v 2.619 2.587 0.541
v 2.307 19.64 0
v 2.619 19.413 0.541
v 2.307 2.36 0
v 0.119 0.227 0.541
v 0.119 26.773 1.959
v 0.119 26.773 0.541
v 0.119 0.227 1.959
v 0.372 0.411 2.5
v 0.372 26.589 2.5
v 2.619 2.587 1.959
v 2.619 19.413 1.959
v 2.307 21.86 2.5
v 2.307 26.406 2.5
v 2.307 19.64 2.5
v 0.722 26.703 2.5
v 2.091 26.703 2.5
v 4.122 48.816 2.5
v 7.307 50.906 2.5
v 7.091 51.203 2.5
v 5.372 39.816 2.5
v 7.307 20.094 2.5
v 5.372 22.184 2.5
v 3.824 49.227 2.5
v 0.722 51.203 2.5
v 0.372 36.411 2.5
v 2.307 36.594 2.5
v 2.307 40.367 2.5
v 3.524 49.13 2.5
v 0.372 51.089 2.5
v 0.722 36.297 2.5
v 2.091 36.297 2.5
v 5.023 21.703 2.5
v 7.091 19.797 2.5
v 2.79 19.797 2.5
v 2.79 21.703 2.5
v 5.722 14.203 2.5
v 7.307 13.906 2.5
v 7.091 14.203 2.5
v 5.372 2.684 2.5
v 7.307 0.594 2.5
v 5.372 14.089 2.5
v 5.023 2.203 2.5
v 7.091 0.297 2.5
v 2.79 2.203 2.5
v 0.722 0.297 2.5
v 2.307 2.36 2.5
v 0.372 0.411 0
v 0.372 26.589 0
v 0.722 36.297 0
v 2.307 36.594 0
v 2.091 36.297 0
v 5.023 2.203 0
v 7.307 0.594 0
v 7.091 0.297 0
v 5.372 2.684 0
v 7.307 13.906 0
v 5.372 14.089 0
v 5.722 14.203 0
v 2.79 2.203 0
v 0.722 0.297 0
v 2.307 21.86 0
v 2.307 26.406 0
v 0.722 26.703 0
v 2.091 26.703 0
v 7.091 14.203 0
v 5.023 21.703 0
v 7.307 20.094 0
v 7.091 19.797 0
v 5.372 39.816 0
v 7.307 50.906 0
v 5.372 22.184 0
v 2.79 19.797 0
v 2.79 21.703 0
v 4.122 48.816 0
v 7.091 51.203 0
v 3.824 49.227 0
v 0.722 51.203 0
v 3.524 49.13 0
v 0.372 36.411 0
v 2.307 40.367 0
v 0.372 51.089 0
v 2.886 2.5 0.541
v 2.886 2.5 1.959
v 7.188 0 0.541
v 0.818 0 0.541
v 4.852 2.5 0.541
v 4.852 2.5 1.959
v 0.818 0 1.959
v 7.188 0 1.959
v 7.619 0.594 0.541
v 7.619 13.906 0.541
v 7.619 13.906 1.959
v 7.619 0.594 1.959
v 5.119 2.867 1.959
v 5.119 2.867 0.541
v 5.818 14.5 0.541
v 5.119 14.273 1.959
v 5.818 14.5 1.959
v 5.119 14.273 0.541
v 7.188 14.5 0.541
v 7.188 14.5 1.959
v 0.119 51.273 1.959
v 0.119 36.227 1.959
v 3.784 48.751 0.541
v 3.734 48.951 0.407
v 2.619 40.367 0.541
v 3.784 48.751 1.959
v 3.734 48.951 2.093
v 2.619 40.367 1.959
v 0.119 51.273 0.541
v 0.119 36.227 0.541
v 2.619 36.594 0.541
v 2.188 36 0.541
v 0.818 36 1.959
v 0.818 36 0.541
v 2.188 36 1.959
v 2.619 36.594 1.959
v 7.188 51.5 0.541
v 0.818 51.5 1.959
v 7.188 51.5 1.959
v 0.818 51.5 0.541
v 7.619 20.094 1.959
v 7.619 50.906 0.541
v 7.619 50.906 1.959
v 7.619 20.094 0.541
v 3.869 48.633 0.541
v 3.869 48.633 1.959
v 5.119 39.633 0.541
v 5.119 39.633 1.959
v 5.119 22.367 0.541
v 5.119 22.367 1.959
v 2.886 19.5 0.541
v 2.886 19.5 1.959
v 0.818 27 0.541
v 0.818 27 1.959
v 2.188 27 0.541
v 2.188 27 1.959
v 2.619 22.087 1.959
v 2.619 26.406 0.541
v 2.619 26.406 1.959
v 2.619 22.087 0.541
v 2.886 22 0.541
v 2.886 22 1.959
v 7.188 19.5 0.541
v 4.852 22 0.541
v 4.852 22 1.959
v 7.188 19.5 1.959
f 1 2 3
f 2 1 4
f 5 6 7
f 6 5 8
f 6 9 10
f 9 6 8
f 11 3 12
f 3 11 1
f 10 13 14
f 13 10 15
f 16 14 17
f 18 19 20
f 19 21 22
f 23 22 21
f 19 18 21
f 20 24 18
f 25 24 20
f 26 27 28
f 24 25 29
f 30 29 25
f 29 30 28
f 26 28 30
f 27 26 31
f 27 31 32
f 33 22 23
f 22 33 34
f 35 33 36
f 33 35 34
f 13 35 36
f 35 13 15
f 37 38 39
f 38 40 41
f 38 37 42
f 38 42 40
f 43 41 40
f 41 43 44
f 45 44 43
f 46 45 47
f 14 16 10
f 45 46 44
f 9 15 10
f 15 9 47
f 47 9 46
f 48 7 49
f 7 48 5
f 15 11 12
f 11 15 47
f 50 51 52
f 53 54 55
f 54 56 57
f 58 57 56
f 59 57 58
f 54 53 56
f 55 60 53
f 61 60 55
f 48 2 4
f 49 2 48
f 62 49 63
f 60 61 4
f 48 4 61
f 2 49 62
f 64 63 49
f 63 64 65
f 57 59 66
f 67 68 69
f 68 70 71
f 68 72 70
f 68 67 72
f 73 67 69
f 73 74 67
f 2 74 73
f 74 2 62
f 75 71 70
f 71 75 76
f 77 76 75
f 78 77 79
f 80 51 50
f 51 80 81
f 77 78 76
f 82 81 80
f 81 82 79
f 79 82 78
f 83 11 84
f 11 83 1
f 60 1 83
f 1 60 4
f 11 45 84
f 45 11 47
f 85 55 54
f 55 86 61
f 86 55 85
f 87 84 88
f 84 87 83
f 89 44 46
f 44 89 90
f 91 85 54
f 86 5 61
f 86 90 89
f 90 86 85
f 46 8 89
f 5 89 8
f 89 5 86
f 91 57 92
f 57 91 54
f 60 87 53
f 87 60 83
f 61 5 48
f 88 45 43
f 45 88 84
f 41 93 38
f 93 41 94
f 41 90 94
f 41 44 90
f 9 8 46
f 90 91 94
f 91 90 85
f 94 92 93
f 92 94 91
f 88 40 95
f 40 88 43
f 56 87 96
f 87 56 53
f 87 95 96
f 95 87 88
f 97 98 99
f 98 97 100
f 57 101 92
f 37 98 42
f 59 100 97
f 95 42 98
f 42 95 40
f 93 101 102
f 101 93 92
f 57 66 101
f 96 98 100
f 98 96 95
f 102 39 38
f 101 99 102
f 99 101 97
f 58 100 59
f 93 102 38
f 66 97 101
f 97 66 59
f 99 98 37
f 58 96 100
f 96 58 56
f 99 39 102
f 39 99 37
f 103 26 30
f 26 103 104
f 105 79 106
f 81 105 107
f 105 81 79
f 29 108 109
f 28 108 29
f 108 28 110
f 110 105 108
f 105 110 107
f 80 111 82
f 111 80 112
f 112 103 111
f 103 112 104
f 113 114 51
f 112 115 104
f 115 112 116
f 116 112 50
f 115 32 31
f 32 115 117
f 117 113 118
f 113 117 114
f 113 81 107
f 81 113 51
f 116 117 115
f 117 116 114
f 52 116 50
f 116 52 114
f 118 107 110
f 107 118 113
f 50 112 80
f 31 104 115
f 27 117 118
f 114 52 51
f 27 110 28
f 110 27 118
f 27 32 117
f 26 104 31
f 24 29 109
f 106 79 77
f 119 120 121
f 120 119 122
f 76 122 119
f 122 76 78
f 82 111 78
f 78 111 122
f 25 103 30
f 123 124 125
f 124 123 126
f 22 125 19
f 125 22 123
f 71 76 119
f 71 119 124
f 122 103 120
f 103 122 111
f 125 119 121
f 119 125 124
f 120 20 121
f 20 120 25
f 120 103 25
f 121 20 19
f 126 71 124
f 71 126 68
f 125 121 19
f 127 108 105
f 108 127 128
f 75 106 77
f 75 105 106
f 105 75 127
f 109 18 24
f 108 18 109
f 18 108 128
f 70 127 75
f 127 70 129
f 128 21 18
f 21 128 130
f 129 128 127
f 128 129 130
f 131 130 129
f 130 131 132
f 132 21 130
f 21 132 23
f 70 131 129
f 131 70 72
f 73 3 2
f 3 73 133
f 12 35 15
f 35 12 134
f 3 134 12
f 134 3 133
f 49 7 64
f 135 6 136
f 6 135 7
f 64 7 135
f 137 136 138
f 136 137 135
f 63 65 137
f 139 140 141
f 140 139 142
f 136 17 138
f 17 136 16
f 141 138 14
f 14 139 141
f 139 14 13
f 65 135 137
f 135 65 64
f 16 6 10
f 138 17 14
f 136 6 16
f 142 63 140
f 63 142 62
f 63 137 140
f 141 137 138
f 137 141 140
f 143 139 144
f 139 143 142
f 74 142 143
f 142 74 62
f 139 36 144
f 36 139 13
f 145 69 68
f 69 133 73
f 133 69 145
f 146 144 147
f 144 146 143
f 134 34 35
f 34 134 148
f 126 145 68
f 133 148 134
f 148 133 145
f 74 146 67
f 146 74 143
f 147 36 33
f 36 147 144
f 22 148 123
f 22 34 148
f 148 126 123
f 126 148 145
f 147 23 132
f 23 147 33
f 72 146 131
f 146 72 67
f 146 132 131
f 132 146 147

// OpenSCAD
// file: Round-Anything/MinkowskiRound.scad
// Library: MinkowskiRound.scad
// Version: 1.0
// Author: IrevDev
// Copyright: 2017
// License: GPL 3

/*
---Modules
round2d(outside radius,internal radius) -> takes 2d children
This module will round 2d any shape

minkowskiRound(outsideRadius,internalRadius,enable,envelopecube[x,y,z]) -> takes 3d children
This module will round any 3d shape though it takes a long time, possibly more than 12 hours (use a low $fn value, 10-15 to begin with) so make sure enable is set to 0 untill you are ready for final render,the envelopecube must be bigger than the object you are rounding, default values are [500,500,500].

minkowskiOutsideRound(radius,enable,envelopecube[x,y,z])
minkowskiInsideRound(radius,enable,envelopecube[x,y,z])
Both this modules do the same thing as minkowskiRound() but focus on either inside or outside radiuses, which means these modules use one less minkowski() (two instead of three) making them quicker if you don't want both inside and outside radiuses.

--Examples
*/

//round2d(1,6)difference(){square([20,20]);square([10,10]);}
//minkowskiRound(3,1.5,1)theshape();
//minkowskiInsideRound(3,1)theshape();
//minkowskiOutsideRound(3,1)theshape();

//---good test child for examples
//module theshape(){//example shape
//    difference(){
//        cube([20,20,20]);
//        cube([10,10,10]);
//    }
//}

//minkowskiRound(0.5,2,1,[50,50,50])union(){//--example in the thiniverse thumbnail/main image
//   cube([6,6,22]);
//    rotate([30,45,10])cylinder(h=22,d=10);
//}//--I rendered this out with a $fn=25 and it took more than 12 hours on my computer


module round2d(OR=3,IR=1){
  offset(OR){
    offset(-IR-OR){
      offset(IR){
        children();
      }
    }
  }
}

module minkowskiRound(OR=1,IR=1,enable=1,cubeSize=[500,500,500]){
  if(enable==0){//do nothing if not enabled
    children();
  } else {
    minkowski(){//expand the now positive shape back out
      difference(){//make the negative shape positive again
        cube(cubeSize-[0.1,0.1,0.1],center=true);
        minkowski(){//expand the negative shape inwards
          difference(){//create a negative of the children
            cube(cubeSize,center=true);
            minkowski(){//expand the children
              children();
              sphere(IR);
            }
          }
          sphere(OR+IR);
        }
      }
      sphere(OR);
    }
  }
}

module minkowskiOutsideRound(r=1,enable=1,cubeSize=[500,500,500]){
  if(enable==0){//do nothing if not enabled
    children();
  } else {
    minkowski(){//expand the now positive shape
      difference(){//make the negative positive
        cube(cubeSize-[0.1,0.1,0.1],center=true);
        minkowski(){//expand the negative inwards
          difference(){//create a negative of the children
            cube(cubeSize,center=true);
            children();
          }
          sphere(r);
        }
      }
      sphere(r);
    }
  }
}

module minkowskiInsideRound(r=1,enable=1,cubeSize=[500,500,500]){
  if(enable==0){//do nothing if not enabled
    children();
  } else {
    difference(){//make the negative positive again
      cube(cubeSize-[0.1,0.1,0.1],center=true);
      minkowski(){//expand the negative shape inwards
        difference(){//make the expanded children a negative shape
          cube(cubeSize,center=true);
          minkowski(){//expand the children
            children();
            sphere(r);
          }
        }
        sphere(r);
      }
    }
  }
}
// main file
/*
    This work is dual licensed under the GPL 3.0 and the GNU Lesser General Public License as per http://creativecommons.org/licenses/LGPL/2.1/
    Copyright (C) 2021 Bernd Zeimetz <bernd@bzed.de>
*/


// requires https://github.com/Irev-Dev/Round-Anything
use <Round-Anything/MinkowskiRound.scad>;

t = 2.5; //line thickness
s = 2.5; //material (space) thickness
ml = 17; //mask space
hl = 27; //helmet space
ho = 2.5; //helmet opening
mo = 5; //mask opening
h = 2.5; //height

hh1 = t + ml + t + (s + t);
hh2 = t + ml + t;
hh3 = hh2 + (hl/3*2);
hh4 = hh2 + hl;
hh5 = hh4 + t;
hh6 = hh1 + hl/3;

mh1 = t + ml;
mh2 = mh1 - mo;

t1 = t + s/2;
t2 = t + s;
t3 = t + s + t;

r = (t + h) / 8;

ppoints = [
    [0,0],
    [0,hh1],
    [t,hh1],
    [t,hh2],
    [t2,hh2],
    [t2,hh3],
    [t1,hh4],
    [t,hh3],
    [t,hh2],
    [t,hh6],
    [0,hh6],
    [0,hh5],
    [t3,hh5],
    [t3,mh1],
    [t,mh1],
    [t,t],
    [t2,t],
    [t2,mh2],
    [t3,mh2],
    [t3,0]
];

minkowskiOutsideRound(r, true, [200,200,200]) {
     linear_extrude(height=h) {
         polygon(ppoints);
     }
 }
